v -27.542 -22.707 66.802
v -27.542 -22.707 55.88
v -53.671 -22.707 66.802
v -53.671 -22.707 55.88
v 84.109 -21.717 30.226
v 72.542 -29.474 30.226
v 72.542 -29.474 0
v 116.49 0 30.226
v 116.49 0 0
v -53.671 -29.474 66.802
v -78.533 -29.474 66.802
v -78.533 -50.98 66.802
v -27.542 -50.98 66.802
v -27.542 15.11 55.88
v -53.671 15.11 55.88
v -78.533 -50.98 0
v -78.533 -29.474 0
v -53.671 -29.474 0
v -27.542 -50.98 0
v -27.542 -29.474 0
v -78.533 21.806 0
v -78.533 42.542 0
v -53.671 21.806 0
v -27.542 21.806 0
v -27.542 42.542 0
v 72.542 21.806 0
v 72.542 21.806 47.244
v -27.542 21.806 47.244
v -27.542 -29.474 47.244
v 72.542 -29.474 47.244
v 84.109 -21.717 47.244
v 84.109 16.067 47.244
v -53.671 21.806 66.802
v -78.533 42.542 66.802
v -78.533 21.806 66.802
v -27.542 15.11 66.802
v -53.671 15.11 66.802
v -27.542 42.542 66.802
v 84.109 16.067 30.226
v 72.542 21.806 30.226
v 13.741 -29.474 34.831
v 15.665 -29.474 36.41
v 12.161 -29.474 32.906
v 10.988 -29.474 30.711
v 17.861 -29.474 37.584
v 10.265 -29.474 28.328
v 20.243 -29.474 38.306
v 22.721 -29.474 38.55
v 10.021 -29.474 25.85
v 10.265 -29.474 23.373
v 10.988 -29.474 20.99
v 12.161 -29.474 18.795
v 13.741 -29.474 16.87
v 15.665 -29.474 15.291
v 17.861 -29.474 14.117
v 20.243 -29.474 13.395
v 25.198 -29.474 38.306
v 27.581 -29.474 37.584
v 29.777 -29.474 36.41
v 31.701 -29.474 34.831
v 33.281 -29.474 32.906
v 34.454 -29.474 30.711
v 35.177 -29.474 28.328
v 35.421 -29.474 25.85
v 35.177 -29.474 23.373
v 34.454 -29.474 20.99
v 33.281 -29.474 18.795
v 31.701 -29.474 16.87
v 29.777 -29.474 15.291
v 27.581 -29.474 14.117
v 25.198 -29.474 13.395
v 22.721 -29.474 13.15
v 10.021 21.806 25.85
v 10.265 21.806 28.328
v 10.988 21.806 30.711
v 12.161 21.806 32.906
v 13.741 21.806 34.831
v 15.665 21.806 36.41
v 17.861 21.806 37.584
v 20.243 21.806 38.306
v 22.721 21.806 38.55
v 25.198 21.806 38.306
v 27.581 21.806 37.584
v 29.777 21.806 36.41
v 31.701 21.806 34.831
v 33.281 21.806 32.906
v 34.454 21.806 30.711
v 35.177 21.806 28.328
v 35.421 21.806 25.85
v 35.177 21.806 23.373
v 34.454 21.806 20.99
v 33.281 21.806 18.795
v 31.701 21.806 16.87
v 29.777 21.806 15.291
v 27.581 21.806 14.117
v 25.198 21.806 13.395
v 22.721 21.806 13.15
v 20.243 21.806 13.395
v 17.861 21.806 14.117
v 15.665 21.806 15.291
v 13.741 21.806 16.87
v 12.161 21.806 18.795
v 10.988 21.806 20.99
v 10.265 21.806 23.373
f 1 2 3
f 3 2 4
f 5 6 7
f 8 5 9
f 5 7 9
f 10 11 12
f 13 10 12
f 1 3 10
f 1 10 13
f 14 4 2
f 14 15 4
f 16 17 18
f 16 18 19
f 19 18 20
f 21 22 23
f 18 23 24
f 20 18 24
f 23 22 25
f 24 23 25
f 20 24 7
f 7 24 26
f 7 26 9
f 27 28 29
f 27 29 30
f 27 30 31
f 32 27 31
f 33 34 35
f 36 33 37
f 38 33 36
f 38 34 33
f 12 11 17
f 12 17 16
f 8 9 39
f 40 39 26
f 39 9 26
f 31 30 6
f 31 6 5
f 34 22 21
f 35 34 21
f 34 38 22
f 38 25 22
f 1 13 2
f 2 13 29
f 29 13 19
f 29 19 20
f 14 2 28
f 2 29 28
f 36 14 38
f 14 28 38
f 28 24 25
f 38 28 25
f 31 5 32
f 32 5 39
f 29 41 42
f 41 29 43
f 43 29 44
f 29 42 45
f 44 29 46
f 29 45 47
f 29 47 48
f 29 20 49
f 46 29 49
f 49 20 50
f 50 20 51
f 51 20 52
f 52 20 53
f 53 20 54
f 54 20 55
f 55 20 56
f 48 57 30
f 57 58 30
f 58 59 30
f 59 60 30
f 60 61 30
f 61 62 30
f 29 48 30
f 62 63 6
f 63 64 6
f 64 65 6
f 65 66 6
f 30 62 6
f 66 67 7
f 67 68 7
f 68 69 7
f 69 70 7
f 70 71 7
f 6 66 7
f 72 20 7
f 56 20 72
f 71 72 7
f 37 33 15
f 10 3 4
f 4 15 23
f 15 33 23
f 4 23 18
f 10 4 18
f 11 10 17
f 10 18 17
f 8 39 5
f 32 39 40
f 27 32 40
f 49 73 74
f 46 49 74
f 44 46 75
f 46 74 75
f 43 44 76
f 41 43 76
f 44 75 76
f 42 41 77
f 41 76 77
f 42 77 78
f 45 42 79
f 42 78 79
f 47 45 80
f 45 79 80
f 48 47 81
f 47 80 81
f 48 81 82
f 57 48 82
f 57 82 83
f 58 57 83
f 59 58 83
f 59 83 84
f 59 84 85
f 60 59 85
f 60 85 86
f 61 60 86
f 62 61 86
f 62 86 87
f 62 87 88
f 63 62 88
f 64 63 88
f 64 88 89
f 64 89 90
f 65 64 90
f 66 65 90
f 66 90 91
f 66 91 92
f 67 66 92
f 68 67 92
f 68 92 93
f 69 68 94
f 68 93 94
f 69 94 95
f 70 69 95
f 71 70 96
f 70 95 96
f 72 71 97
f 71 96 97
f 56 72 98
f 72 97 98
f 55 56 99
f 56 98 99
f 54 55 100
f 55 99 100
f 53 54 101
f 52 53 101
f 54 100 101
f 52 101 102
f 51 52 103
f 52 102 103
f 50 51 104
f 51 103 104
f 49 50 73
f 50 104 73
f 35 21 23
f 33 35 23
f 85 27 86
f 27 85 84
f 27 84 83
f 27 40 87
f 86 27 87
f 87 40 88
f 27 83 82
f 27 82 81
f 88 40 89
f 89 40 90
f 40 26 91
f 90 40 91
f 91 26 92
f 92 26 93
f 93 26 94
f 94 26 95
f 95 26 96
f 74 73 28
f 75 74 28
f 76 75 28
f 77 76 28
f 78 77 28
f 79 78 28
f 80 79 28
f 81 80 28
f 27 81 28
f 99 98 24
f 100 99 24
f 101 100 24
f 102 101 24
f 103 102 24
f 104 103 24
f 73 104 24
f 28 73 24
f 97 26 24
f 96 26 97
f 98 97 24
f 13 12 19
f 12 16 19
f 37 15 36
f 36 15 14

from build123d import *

# Parameters (mm, degrees)
F1_DEPTH = 30.226
F3_DEPTH = 17.018
F5_DEPTH = 25.654
F7_DEPTH = 10.922
F9_DEPTH = 10.922
F11_D    = 25.4


with BuildPart() as f1:
    # F0 (on Top) → F1 (new body)
    with BuildSketch(Plane.XY):
        Polygon((-27.542058, -29.474055), (-13.702727, -29.474055), (72.541967, -29.474055), (116.490424, 0), (72.541967, 21.806085), (-27.542058, 21.806085), (-27.542058, 42.54153), (-78.533083, 42.54153), (-78.533083, 21.806085), (-61.017197, 21.806085), (-53.670939, 21.806085), (-53.670939, -29.474055), (-78.533083, -29.474055), (-78.533083, -50.979555), (-27.542058, -50.979555), align=None)
    extrude(amount=F1_DEPTH)

    # F2 (on face) → F3 (join)
    with BuildSketch(Plane.XY.offset(30.226)):
        Polygon((84.1086, -21.716887), (84.1086, 16.067022), (72.541967, 21.806085), (-27.542058, 21.806085), (-27.542058, -29.474055), (72.541967, -29.474055), align=None)
    extrude(amount=F3_DEPTH)

    # F4 (on face) → F5 (join)
    with BuildSketch(Plane.XY.offset(30.226)):
        Polygon((-27.542058, 42.54153), (-78.533083, 42.54153), (-78.533083, 21.806085), (-53.670939, 21.806085), (-53.670939, -29.474055), (-78.533083, -29.474055), (-78.533083, -50.979555), (-27.542058, -50.979555), align=None)
    extrude(amount=F5_DEPTH)

    # F6 (on face) → F7 (join)
    with BuildSketch(Plane.XY.offset(55.88)):
        Polygon((-53.670939, 21.806085), (-53.670939, 15.110248), (-27.542058, 15.110248), (-27.542058, 42.54153), (-78.533083, 42.54153), (-78.533083, 21.806085), align=None)
    extrude(amount=F7_DEPTH)

    # F8 (on face) → F9 (join)
    with BuildSketch(Plane.XY.offset(55.88)):
        Polygon((-53.670939, -22.706658), (-53.670939, -29.474055), (-78.533083, -29.474055), (-78.533083, -50.979555), (-27.542058, -50.979555), (-27.542058, -22.706658), align=None)
    extrude(amount=F9_DEPTH)

    # F11 (through all)
    with Locations(Plane.XZ.offset(29.474055)):
        with Locations((22.720842, 25.850486)):
            Hole(F11_D / 2)


solid = f1.part
